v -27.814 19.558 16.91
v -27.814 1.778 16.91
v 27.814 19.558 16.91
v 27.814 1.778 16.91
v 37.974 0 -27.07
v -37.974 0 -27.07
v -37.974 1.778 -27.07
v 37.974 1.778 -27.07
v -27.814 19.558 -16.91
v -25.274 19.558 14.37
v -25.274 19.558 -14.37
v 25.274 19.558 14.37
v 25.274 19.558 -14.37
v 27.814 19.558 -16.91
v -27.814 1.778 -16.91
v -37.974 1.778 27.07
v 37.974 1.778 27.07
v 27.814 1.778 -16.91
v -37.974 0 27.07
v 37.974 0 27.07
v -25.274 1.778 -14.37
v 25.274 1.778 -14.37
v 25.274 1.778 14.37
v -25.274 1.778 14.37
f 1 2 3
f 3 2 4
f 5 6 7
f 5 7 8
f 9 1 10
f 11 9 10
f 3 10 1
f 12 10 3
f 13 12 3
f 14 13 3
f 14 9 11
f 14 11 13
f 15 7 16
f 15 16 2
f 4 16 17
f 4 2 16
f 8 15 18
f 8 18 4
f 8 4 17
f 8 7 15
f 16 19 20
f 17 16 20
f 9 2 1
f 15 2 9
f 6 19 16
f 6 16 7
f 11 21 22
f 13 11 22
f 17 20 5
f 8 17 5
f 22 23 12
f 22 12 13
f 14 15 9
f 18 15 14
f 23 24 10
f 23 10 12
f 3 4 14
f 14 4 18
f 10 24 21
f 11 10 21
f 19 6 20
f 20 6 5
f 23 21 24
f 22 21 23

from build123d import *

# Parameters (mm, degrees)
SKETCH1_W           = 75.947601036
SKETCH1_H           = 54.14073695
BOSS_EXTRUDE1_DEPTH = 1.778
SKETCH2_W           = 55.627601036
SKETCH2_H           = 33.82073695
SKETCH2_W_2         = 50.547601036
SKETCH2_H_2         = 28.74073695
EXTRUDE_THIN1_DEPTH = 17.78


with BuildPart() as part:
    # Sketch1 → Boss-Extrude1 (new body)
    with BuildSketch(Plane(origin=(0, 0, 0), x_dir=(1, 0, 0), z_dir=(0, 1, 0))):
        Rectangle(SKETCH1_W, SKETCH1_H)
    extrude(amount=BOSS_EXTRUDE1_DEPTH)

    # Sketch2 → Extrude-Thin1 (add)
    with BuildSketch(Plane(origin=(0, 1.778, 0), x_dir=(1, 0, 0), z_dir=(0, 1, 0))):
        Rectangle(SKETCH2_W, SKETCH2_H)
        Rectangle(SKETCH2_W_2, SKETCH2_H_2, mode=Mode.SUBTRACT)
    extrude(amount=EXTRUDE_THIN1_DEPTH)


solid = part.part
